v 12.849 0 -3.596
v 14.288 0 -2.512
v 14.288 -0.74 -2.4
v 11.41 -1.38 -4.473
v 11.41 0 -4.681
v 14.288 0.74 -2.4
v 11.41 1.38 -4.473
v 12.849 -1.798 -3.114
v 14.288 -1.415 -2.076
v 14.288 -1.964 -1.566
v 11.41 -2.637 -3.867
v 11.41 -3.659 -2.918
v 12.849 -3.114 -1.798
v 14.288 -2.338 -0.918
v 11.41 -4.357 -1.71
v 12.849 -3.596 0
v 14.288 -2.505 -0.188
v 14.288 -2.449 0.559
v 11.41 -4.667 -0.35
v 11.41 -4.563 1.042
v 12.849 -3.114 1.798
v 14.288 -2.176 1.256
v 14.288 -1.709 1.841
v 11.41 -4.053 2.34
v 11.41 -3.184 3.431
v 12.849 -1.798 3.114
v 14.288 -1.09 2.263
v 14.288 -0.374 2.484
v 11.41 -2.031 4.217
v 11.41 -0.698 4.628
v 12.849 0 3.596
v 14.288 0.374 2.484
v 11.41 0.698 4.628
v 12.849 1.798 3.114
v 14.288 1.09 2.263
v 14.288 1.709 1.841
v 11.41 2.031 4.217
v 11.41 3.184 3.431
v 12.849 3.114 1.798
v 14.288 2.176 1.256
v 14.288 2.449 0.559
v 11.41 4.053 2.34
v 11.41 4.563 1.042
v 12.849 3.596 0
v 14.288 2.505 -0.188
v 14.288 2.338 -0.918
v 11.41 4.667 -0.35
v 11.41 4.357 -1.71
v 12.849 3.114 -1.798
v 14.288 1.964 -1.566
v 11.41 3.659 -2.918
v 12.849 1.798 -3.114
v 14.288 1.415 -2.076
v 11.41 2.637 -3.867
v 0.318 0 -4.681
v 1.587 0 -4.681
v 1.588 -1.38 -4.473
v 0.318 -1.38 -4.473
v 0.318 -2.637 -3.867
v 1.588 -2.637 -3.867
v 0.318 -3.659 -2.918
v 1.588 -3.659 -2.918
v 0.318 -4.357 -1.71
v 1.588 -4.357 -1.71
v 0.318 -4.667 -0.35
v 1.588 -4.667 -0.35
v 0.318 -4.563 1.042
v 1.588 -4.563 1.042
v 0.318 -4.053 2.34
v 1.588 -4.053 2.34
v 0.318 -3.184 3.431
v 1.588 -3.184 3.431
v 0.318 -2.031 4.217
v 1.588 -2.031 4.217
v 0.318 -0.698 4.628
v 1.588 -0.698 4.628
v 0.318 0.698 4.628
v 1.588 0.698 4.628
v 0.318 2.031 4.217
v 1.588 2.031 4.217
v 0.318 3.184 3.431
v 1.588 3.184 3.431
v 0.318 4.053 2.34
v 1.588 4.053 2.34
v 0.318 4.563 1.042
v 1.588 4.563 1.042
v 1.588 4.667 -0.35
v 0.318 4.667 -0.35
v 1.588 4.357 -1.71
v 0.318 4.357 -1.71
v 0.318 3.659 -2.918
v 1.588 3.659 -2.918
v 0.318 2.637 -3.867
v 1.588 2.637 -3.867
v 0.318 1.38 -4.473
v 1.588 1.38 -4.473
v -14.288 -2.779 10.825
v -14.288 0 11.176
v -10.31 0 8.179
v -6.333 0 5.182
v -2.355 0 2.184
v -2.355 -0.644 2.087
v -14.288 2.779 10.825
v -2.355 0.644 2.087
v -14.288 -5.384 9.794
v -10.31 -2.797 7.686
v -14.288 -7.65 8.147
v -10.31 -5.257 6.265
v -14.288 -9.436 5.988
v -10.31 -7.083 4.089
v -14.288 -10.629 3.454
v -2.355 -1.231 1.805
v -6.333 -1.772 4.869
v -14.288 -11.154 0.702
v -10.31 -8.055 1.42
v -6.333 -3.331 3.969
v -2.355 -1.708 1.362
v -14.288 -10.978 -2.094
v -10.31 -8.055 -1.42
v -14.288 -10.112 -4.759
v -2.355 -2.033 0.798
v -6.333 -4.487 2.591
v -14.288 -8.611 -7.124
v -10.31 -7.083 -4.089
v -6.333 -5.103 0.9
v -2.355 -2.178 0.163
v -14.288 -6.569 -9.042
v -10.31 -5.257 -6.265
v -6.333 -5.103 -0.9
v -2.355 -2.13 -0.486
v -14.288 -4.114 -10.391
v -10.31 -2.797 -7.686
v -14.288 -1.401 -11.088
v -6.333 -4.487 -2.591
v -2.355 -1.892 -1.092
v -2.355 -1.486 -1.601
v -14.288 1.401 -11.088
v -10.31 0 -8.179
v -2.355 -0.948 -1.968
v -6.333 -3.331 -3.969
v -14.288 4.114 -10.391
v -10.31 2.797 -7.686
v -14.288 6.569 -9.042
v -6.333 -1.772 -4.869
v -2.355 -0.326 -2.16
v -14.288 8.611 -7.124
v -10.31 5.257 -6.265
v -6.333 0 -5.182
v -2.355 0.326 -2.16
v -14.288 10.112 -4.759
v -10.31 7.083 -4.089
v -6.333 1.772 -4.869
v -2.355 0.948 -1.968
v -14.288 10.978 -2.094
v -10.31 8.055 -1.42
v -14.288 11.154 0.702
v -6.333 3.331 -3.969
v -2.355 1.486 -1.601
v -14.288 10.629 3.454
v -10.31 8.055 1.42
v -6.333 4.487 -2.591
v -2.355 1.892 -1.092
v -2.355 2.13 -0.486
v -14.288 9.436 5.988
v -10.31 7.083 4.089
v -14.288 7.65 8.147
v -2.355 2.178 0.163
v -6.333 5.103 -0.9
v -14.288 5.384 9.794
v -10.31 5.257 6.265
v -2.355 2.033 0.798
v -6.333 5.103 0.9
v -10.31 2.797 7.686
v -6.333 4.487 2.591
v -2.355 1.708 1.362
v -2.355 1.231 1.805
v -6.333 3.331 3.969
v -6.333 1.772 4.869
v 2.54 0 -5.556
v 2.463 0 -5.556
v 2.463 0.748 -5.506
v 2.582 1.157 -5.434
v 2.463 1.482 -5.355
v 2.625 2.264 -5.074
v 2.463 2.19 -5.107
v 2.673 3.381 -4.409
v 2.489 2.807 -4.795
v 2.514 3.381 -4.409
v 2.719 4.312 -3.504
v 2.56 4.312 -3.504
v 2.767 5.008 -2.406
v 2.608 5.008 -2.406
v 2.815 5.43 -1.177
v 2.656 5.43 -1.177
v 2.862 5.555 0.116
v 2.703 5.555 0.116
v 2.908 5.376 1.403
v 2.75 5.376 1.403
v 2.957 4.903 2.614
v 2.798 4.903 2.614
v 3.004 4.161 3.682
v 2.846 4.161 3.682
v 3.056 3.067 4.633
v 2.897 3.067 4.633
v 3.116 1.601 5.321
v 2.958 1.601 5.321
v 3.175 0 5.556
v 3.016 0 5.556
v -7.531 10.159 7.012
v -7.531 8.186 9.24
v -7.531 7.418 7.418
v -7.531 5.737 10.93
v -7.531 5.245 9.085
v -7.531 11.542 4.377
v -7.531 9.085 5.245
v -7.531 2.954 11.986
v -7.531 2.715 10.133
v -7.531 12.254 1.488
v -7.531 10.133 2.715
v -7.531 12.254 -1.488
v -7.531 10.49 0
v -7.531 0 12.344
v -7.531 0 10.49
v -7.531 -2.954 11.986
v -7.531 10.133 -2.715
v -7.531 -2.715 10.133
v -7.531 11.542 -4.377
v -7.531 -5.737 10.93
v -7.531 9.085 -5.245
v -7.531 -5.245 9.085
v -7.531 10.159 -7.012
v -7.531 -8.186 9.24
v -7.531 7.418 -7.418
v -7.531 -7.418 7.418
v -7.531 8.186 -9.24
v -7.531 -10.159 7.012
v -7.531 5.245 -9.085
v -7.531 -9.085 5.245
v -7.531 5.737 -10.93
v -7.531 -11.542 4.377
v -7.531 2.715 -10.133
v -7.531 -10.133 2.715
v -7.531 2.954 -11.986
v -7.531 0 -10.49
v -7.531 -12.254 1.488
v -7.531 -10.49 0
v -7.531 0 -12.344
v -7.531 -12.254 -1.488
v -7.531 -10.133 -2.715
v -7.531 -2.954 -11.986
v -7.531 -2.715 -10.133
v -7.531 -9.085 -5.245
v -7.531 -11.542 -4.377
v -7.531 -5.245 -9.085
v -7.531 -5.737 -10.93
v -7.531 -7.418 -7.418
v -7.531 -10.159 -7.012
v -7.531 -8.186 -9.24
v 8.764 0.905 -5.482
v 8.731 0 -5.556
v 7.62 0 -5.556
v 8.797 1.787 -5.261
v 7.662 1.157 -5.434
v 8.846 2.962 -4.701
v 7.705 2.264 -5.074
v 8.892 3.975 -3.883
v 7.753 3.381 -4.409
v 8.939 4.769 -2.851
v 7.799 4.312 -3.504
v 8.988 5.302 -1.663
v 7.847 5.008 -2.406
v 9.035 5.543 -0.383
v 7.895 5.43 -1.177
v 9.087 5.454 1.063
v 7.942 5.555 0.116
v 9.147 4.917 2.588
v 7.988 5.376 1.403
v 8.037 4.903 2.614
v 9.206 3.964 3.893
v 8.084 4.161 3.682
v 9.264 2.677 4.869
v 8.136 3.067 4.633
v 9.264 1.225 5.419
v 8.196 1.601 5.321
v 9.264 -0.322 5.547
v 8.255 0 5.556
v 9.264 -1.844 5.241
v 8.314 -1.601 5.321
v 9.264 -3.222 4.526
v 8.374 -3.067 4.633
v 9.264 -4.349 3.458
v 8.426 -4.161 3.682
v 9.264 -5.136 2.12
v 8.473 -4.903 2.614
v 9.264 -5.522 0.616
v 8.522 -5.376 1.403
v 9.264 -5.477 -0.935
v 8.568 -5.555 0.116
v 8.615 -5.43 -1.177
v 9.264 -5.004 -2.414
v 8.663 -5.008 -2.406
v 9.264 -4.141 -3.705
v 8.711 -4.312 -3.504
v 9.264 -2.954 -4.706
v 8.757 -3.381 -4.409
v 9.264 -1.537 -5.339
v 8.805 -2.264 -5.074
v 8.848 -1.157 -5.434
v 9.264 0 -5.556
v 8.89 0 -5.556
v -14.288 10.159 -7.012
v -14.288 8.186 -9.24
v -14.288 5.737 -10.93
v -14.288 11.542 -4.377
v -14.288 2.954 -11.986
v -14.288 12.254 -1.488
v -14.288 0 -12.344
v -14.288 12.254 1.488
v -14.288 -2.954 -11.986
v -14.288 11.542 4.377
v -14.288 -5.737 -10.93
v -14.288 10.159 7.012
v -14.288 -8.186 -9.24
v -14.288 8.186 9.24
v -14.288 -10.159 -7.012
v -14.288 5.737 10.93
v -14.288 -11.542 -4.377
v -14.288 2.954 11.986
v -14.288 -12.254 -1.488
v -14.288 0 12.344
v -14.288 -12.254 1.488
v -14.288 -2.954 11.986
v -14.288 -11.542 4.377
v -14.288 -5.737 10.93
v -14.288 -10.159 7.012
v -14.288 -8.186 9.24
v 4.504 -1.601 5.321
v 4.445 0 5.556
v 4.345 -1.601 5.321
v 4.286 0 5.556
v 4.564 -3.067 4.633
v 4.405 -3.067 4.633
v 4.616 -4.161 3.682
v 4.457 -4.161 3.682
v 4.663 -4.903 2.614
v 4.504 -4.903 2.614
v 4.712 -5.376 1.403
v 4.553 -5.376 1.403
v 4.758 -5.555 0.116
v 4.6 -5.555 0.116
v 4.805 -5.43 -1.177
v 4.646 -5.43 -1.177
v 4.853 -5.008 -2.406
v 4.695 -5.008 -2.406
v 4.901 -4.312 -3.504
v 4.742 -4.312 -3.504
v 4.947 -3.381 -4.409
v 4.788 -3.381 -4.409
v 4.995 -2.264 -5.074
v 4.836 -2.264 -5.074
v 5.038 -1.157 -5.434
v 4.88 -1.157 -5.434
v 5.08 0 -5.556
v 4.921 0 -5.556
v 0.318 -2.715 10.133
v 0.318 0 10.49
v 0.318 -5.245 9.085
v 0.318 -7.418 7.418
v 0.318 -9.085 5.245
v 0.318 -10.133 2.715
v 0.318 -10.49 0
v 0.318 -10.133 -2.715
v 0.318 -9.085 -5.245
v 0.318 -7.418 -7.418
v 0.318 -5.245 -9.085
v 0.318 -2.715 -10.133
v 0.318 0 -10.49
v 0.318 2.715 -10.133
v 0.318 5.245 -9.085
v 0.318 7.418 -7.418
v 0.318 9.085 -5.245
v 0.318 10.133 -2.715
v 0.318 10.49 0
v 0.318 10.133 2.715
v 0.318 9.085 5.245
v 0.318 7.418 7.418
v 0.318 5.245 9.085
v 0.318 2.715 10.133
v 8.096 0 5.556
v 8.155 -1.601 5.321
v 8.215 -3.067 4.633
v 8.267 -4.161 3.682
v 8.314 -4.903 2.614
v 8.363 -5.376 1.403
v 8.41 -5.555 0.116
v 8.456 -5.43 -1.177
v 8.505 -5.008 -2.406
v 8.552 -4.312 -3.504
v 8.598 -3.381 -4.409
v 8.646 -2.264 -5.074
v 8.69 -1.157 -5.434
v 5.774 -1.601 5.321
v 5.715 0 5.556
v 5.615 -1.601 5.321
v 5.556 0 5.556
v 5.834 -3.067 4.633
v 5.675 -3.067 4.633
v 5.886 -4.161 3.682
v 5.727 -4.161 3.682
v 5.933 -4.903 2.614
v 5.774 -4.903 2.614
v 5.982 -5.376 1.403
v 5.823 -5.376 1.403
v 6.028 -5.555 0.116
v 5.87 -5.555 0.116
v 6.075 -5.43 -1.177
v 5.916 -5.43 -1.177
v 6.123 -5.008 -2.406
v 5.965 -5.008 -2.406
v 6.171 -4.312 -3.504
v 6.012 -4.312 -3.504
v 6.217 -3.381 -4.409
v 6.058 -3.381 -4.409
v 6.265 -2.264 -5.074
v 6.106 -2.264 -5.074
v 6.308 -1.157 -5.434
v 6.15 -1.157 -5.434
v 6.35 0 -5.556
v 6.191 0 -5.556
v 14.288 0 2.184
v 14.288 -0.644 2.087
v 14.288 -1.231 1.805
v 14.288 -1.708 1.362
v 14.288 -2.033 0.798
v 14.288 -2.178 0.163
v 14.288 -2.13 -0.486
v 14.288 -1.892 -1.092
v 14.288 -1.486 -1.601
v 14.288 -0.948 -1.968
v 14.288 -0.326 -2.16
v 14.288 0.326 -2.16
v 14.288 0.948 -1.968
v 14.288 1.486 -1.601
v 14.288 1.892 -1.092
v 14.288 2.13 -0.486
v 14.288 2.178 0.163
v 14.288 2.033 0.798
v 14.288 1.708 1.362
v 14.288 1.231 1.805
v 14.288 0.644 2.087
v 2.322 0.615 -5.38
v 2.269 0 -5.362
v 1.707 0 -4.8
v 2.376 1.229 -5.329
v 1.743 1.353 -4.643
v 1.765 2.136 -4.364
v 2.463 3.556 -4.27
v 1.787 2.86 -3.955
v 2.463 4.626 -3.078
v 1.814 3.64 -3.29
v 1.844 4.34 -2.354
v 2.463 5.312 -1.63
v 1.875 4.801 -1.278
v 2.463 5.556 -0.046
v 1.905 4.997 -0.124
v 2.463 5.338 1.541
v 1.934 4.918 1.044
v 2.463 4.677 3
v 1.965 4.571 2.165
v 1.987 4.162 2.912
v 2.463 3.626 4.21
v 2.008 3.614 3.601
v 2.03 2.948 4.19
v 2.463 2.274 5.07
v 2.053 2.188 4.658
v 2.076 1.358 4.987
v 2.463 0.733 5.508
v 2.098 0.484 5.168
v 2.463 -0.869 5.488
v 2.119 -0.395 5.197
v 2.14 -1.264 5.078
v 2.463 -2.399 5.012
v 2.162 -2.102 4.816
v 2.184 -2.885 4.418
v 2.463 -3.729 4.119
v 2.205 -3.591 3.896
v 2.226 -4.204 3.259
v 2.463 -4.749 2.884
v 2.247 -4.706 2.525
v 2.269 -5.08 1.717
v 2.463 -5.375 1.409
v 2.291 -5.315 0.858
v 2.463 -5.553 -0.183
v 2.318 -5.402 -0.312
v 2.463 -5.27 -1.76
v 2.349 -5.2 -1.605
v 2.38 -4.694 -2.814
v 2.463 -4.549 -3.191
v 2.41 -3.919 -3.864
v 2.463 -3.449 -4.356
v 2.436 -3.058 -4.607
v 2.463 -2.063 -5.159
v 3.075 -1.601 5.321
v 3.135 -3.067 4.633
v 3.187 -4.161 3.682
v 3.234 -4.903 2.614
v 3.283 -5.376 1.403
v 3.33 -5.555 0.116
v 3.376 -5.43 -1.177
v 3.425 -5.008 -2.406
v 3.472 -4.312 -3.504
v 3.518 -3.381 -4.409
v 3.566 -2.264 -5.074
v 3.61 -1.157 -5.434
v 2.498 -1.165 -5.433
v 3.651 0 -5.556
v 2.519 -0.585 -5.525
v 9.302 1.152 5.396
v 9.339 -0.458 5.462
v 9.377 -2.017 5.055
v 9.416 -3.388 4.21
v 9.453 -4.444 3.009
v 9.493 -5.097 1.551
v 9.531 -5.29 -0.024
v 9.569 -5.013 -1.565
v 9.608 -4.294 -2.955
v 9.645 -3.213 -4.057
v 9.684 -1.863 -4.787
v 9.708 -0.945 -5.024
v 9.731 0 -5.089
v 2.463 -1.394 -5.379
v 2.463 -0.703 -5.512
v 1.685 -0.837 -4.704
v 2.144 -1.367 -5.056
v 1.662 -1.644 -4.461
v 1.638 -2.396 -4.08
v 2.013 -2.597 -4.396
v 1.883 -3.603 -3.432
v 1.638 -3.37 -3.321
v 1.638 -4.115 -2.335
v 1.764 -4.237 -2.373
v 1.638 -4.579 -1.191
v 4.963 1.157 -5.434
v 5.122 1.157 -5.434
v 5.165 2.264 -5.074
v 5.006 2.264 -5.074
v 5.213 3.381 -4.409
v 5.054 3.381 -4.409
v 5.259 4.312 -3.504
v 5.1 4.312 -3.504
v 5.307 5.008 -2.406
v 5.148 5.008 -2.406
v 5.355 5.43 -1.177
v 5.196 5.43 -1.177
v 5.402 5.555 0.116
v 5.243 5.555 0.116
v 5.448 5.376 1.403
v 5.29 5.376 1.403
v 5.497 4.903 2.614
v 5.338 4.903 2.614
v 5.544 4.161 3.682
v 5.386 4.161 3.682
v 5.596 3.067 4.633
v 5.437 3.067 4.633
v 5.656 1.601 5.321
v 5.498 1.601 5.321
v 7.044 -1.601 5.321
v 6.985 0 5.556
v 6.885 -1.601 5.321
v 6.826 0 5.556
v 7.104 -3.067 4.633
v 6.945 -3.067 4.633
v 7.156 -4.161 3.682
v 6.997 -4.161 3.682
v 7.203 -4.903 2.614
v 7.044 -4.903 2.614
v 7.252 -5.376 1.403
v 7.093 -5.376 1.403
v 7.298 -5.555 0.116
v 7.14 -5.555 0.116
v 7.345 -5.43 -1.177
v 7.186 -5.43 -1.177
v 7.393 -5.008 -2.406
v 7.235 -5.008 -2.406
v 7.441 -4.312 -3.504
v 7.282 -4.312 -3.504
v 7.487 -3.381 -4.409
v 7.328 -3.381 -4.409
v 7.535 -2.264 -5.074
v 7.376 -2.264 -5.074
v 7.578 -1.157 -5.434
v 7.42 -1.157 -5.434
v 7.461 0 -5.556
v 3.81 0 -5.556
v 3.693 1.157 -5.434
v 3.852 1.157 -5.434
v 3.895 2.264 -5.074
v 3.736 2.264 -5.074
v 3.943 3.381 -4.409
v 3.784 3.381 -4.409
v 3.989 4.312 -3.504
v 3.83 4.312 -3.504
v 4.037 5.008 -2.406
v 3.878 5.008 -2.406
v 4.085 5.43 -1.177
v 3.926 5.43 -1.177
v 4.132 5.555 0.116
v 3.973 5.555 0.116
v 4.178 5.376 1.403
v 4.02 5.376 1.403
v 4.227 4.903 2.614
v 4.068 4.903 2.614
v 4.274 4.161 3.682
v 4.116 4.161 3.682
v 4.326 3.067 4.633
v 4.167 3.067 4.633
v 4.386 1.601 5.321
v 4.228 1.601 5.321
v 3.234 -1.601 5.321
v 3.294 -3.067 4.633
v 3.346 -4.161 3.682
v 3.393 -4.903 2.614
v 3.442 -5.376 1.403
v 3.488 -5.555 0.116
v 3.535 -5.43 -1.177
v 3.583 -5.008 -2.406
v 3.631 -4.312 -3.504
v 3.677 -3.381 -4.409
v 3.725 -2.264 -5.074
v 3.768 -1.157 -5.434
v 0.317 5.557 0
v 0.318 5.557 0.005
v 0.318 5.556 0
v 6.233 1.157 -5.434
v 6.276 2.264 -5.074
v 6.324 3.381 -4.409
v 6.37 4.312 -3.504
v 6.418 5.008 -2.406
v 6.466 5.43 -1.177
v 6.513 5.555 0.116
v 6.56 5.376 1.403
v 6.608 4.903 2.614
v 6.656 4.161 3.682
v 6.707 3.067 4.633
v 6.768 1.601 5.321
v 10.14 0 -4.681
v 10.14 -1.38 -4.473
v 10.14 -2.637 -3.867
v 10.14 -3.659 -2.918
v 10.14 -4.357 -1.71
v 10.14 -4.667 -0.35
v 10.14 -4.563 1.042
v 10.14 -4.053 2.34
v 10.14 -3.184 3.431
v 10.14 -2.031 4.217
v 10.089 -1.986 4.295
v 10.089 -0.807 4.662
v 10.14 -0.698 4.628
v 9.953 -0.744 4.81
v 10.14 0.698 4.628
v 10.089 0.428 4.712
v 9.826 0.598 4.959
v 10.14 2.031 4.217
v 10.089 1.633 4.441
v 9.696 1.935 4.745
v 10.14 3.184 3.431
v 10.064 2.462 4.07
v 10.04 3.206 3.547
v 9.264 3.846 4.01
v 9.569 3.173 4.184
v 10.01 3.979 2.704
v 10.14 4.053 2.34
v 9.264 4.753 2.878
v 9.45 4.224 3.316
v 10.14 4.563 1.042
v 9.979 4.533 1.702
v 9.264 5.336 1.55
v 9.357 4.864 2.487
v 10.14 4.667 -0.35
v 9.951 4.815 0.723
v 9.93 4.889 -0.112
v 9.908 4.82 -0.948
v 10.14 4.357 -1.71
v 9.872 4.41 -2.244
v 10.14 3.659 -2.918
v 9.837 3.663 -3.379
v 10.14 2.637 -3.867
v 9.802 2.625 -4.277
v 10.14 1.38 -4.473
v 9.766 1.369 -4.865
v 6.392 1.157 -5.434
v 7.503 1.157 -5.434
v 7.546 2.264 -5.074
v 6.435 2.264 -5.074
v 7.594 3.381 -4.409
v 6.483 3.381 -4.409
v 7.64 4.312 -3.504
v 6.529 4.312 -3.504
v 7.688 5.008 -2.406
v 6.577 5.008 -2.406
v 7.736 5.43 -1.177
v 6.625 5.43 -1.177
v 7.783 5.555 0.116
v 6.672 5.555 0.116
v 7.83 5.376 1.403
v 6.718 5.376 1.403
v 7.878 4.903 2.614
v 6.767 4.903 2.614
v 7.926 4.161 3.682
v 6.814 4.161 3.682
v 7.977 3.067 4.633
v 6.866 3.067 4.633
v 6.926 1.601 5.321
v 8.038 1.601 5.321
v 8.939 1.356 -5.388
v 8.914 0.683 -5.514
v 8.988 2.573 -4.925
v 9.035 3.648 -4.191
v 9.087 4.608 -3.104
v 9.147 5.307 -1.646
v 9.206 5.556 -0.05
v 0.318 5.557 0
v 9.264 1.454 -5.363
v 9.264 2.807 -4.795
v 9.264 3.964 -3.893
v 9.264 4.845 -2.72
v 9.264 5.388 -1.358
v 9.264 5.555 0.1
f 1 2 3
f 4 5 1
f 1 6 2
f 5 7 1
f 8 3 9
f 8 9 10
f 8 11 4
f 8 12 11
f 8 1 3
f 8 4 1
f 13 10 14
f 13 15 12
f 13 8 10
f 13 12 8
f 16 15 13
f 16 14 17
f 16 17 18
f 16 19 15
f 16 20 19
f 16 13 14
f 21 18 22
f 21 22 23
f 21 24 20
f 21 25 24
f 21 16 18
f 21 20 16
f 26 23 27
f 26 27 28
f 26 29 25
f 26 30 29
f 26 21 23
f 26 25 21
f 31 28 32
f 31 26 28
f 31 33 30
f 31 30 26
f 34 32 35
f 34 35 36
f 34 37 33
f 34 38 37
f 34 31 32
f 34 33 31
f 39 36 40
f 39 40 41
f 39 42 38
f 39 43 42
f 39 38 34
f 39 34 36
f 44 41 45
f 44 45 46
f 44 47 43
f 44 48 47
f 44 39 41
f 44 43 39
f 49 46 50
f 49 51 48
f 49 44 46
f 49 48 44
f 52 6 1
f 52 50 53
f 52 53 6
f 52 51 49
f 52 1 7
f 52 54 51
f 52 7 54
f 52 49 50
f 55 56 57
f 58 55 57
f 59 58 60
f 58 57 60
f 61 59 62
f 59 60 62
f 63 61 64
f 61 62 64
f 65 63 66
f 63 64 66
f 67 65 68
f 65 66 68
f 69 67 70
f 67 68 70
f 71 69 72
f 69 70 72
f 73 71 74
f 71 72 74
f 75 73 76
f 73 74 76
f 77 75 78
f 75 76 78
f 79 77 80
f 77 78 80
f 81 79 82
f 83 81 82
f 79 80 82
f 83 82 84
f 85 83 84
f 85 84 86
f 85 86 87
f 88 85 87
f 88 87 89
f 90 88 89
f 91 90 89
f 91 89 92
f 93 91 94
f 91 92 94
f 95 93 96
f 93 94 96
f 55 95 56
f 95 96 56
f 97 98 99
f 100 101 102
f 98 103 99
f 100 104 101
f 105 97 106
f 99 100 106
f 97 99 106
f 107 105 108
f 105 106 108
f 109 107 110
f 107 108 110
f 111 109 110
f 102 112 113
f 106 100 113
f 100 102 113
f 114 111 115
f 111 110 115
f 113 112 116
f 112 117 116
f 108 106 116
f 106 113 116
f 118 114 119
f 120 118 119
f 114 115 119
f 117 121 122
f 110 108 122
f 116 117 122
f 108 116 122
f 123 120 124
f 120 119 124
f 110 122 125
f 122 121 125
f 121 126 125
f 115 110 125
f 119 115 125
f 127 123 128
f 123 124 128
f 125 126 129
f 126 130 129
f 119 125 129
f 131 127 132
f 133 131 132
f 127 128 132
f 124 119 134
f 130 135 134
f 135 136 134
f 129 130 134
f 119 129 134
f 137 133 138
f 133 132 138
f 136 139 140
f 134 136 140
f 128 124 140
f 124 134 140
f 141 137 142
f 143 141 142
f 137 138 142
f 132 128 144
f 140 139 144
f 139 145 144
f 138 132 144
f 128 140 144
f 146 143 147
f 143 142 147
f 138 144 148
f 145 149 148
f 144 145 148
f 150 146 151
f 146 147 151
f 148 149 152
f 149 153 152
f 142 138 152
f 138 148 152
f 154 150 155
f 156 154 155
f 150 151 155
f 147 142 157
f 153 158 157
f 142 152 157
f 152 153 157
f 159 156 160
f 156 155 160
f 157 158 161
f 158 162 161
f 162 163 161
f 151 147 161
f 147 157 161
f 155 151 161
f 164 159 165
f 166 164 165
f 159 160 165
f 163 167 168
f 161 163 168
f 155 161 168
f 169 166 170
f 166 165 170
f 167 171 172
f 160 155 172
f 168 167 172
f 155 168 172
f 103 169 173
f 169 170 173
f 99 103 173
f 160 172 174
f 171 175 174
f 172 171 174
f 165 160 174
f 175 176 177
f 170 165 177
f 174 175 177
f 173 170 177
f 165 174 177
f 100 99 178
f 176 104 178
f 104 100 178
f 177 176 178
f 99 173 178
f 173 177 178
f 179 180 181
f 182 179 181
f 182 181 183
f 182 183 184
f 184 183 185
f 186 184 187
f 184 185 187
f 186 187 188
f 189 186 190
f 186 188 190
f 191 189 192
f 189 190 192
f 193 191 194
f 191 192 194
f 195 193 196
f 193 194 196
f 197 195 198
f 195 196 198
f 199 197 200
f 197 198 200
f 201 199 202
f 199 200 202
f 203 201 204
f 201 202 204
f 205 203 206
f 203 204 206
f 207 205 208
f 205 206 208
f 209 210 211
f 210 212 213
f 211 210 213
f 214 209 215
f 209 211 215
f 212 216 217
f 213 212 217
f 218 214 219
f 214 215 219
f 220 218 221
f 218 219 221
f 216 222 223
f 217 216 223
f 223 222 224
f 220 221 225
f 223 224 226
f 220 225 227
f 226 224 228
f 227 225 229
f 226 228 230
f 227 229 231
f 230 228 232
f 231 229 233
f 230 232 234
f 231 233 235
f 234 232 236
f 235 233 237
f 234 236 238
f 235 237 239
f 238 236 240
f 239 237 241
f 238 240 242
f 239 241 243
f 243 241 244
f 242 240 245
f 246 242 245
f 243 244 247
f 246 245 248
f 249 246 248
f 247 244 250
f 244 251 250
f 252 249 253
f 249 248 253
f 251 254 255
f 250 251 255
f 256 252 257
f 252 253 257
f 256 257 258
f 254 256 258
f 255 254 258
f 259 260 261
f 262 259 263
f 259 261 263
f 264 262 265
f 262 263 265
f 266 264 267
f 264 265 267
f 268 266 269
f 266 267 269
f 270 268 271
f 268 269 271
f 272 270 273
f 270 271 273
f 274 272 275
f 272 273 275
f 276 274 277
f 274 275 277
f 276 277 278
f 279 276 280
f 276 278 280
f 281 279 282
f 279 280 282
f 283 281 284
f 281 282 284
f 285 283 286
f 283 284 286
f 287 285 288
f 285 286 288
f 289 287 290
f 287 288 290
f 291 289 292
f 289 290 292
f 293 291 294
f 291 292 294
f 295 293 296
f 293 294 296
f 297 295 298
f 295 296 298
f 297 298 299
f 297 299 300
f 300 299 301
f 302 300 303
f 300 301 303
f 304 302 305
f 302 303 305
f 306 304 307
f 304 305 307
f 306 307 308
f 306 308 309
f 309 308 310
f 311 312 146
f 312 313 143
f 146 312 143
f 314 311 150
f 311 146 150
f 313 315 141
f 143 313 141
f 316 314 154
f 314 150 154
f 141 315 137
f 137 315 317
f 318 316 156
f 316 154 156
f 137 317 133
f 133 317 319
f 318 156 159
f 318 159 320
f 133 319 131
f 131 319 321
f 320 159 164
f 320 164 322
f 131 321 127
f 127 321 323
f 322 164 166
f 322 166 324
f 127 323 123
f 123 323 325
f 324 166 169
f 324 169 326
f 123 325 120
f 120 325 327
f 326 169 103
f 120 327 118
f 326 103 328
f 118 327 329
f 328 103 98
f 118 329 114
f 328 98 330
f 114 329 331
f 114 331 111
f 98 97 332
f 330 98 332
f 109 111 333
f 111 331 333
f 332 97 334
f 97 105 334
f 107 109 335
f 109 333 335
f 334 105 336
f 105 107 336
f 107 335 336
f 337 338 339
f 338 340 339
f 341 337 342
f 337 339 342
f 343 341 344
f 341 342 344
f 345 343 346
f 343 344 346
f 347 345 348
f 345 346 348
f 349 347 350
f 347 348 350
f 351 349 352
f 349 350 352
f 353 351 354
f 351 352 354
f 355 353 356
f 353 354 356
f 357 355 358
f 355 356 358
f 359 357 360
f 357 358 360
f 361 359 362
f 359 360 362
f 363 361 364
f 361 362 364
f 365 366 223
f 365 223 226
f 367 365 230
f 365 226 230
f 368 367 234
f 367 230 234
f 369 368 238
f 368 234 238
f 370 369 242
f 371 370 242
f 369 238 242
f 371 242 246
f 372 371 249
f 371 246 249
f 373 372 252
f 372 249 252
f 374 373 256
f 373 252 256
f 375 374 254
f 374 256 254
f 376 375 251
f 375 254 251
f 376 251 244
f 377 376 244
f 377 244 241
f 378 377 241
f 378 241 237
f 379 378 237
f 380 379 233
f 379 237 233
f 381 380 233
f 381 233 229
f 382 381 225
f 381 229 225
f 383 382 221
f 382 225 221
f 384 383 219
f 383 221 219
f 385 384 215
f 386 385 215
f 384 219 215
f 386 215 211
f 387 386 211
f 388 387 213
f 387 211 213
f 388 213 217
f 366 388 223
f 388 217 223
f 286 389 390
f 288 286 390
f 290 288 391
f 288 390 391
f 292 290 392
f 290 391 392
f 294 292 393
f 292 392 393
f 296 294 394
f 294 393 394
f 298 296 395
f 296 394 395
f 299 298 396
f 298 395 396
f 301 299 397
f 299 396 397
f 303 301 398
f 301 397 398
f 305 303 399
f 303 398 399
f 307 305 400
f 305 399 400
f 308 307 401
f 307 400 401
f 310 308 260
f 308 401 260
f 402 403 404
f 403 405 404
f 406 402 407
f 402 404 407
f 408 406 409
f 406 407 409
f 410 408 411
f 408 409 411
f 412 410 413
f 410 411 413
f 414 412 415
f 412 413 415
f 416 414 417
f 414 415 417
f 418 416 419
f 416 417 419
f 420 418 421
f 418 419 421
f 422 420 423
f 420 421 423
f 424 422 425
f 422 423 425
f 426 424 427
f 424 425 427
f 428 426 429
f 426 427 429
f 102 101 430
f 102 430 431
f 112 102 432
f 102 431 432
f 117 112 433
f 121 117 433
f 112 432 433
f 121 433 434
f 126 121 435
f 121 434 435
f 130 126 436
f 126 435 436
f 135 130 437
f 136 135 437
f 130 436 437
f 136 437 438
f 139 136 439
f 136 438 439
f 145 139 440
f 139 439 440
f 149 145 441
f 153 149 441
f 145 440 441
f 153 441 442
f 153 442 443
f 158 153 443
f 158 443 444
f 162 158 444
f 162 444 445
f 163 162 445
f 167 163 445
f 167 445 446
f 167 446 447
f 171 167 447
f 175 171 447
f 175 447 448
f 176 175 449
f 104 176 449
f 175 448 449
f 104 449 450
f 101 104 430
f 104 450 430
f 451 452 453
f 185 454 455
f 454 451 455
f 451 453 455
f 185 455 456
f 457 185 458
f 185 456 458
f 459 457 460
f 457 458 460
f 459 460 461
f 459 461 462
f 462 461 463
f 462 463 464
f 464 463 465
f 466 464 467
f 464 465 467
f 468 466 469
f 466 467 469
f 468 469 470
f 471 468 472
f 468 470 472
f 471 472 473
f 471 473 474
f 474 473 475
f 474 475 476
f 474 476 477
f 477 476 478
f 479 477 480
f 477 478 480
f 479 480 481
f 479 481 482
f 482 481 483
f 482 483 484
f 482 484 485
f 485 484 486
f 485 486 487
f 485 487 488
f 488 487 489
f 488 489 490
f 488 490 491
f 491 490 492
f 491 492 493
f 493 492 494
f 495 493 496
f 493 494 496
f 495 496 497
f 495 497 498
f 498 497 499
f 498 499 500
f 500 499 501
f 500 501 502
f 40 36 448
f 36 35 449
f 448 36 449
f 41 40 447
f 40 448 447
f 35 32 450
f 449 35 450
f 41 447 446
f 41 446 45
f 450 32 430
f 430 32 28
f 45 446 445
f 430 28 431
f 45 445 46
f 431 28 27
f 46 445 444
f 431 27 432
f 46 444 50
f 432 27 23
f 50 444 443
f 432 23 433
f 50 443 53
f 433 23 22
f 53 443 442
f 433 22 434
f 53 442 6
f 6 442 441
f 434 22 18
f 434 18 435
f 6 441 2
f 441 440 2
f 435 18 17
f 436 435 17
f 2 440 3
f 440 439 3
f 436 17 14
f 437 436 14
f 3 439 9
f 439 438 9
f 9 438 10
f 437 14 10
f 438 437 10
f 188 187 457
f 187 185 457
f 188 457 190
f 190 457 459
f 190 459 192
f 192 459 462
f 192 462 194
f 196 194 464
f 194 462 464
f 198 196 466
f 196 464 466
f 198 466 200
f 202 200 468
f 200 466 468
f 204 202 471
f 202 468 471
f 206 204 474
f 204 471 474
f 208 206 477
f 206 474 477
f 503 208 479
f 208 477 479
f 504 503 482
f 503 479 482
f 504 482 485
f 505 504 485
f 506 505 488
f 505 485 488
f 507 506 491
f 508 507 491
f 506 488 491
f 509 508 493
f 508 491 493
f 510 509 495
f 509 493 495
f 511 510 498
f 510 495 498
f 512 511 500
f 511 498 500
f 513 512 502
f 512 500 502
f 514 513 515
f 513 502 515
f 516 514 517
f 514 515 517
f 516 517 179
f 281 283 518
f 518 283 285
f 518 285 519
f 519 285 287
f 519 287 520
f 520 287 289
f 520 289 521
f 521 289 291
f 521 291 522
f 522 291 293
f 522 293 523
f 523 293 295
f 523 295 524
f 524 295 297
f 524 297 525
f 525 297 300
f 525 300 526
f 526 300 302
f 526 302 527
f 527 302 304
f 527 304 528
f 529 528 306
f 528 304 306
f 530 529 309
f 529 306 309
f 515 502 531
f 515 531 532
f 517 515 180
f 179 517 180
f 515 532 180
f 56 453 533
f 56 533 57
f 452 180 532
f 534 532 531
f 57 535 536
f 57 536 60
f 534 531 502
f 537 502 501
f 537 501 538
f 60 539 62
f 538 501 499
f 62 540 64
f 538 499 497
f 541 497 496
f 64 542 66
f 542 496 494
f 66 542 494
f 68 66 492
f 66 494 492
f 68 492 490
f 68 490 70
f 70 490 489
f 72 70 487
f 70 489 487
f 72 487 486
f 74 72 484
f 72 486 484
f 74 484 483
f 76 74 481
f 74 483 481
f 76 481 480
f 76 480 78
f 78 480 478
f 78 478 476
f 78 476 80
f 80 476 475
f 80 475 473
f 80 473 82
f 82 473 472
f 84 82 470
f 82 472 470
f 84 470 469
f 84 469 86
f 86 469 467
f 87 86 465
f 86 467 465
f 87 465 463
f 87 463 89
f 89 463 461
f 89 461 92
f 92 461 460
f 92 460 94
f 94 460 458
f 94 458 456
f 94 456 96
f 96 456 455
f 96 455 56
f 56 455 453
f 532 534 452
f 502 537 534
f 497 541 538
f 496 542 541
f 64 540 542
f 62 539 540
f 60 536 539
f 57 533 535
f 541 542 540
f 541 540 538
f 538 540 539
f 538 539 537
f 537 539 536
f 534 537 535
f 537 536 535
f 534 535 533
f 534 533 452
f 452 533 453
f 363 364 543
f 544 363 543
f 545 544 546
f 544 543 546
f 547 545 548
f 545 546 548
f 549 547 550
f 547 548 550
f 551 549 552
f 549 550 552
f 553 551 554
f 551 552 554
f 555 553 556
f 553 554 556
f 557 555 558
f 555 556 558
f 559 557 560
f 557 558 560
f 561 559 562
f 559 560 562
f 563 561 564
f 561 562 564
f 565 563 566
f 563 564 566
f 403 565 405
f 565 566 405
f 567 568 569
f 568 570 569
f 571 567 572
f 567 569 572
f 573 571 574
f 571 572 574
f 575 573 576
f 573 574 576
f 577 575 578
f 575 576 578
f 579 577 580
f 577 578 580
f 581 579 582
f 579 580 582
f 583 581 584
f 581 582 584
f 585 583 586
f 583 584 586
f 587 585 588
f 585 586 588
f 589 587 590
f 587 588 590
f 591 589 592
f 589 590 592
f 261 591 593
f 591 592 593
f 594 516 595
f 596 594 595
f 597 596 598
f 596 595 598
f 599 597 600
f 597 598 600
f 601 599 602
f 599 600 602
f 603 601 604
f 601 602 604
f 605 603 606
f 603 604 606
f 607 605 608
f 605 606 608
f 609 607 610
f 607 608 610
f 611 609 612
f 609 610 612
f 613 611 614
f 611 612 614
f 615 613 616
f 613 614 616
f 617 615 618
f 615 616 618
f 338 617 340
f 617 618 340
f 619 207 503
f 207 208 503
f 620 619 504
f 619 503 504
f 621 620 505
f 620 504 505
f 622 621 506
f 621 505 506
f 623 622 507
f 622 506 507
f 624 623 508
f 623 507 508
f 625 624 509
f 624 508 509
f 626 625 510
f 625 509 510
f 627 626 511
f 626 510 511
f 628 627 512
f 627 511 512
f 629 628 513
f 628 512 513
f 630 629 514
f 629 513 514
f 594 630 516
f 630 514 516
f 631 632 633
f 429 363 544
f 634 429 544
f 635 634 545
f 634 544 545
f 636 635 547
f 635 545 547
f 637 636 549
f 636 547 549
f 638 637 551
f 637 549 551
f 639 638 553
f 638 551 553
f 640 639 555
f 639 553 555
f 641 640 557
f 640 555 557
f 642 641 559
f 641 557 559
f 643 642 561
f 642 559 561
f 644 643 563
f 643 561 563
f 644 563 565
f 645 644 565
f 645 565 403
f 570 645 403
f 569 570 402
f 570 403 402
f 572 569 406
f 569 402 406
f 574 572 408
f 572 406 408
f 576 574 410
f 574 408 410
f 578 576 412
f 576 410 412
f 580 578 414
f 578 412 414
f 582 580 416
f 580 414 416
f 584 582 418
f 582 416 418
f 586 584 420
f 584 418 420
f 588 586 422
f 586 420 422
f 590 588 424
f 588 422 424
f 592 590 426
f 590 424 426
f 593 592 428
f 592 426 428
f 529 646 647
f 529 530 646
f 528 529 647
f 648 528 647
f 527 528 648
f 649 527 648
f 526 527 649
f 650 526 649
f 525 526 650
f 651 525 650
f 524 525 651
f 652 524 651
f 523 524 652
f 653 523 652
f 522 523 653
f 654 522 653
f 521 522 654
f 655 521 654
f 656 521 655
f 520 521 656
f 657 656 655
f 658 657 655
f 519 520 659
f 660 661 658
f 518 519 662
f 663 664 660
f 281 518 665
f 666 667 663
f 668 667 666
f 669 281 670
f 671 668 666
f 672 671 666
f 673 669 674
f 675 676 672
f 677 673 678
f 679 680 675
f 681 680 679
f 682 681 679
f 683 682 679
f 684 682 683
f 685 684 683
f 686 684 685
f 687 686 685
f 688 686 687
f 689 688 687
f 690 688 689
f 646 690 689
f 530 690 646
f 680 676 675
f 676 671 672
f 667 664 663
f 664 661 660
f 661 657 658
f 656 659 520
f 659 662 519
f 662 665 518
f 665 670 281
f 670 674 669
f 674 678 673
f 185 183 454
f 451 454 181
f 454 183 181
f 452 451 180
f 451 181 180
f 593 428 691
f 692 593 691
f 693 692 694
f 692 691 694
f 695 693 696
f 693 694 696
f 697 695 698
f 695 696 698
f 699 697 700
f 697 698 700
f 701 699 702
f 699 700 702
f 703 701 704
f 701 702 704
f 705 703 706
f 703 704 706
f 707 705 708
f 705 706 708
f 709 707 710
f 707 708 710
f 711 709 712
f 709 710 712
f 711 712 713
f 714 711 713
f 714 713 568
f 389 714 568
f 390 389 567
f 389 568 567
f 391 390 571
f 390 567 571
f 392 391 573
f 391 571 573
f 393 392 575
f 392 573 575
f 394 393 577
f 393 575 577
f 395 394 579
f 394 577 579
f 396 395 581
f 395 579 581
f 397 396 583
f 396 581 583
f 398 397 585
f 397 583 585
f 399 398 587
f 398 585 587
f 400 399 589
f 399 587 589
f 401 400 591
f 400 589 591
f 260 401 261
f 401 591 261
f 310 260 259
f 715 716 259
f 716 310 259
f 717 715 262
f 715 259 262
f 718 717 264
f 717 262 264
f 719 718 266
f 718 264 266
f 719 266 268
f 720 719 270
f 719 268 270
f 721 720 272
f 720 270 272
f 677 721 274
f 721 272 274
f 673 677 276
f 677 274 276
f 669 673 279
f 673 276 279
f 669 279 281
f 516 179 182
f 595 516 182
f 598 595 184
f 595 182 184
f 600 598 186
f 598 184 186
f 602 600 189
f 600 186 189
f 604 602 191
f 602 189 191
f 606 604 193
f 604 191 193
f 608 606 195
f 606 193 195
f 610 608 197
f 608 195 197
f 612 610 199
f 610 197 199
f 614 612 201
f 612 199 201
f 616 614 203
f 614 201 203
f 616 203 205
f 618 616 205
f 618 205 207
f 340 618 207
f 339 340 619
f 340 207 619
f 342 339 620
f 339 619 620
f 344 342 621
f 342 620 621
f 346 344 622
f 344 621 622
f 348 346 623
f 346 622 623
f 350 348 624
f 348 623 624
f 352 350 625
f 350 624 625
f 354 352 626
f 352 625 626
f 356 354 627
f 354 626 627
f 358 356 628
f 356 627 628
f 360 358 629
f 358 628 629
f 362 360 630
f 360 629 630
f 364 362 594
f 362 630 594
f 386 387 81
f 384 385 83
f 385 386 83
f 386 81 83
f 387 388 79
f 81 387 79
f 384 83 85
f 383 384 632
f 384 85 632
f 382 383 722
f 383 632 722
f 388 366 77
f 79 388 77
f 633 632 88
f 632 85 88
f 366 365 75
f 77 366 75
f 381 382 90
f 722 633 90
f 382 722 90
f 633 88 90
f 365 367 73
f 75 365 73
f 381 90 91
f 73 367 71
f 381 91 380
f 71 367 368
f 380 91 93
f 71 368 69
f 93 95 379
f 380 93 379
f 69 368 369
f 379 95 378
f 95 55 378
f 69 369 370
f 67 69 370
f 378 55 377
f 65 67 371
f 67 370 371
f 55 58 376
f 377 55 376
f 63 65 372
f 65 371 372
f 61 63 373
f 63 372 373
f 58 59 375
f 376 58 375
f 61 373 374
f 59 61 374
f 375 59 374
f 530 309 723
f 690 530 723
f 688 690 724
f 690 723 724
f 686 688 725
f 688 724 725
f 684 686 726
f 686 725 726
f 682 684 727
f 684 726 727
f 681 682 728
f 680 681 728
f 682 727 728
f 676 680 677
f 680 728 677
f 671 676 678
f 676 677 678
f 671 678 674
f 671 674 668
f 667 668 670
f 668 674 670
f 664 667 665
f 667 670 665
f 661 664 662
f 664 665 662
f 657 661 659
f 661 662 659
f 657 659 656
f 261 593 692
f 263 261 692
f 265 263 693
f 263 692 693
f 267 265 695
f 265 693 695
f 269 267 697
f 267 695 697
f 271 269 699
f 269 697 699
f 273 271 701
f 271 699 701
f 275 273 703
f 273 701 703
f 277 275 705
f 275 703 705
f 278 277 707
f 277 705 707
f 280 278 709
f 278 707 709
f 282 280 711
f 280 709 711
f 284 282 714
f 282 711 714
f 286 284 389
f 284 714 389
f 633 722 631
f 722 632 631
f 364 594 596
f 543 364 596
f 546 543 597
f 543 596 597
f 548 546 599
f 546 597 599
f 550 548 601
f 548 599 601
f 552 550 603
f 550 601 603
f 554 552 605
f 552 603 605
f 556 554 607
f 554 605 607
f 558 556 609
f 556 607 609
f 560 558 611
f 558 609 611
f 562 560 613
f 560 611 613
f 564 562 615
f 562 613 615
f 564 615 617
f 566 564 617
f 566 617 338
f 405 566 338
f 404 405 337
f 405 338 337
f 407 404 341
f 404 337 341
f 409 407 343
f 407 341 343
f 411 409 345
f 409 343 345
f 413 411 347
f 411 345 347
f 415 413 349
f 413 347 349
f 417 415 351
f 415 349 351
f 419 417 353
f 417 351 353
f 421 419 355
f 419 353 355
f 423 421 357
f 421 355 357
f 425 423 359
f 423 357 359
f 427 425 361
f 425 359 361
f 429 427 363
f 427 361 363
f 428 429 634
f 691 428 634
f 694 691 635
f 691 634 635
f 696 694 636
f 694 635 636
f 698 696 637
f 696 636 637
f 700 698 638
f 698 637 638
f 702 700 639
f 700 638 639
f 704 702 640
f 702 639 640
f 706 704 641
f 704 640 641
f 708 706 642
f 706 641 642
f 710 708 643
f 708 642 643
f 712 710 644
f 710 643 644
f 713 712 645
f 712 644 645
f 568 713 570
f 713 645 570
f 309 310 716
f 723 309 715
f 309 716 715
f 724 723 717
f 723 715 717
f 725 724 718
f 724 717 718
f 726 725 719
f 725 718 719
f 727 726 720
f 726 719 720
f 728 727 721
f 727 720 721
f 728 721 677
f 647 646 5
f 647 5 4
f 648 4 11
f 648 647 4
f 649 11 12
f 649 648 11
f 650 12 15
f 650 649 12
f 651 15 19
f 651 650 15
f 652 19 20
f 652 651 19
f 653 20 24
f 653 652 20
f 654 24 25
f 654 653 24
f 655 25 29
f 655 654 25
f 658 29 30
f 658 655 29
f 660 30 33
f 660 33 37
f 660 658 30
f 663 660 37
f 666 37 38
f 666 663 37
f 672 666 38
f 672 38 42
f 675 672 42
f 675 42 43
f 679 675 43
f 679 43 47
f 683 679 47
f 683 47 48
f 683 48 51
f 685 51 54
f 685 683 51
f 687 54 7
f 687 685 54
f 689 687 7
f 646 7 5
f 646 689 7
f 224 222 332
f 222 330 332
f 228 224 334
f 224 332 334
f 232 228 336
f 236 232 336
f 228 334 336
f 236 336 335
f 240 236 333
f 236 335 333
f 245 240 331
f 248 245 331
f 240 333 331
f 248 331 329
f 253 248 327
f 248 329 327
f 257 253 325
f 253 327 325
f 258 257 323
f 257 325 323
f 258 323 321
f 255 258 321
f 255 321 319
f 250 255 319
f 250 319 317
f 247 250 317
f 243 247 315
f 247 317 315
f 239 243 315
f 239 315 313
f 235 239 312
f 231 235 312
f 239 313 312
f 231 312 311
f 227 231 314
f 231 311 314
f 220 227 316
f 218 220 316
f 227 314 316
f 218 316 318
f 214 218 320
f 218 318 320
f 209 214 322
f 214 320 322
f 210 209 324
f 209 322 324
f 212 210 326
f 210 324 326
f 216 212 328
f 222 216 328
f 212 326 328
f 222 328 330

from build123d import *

# Parameters (mm, degrees)
CUT_SWEEP1_PITCH = 1.27


with BuildPart() as part:
    # Sketch1 → Revolve1 (revolve)
    with BuildSketch(Plane.XY, mode=Mode.PRIVATE) as revolve1_sk:
        Polygon((-14.2875, 12.3444), (-14.2875, 11.176), (-2.355243782, 2.1844), (14.2875, 2.1844), (14.2875, 2.51206), (14.2875, 5.55625), (10.247723424, 5.55625), (0.3175, 5.55625), (0.3175, 10.4902), (-7.5311, 10.4902), (-7.5311, 12.3444), align=None)
    revolve(revolve1_sk.sketch.rotate(Axis((-14.2875, 0, 0), (1, 0, 0)), 90), axis=Axis((-14.2875, 0, 0), (1, 0, 0)))

    # Cut-Sweep1: the profile of Sketch4 profile screwed along a right-hand helix of 11 turns, 8 arcs to a turn; built about Z, then put on its axis
    cut_sweep1_z = Axis((0, 0, 0), (0, 0, 1))
    cut_sweep1_corners = [(5.55655, 0, 0.000173205), (5.55655, 0, -1.111423205), (4.731360803, 0, -0.635), (4.731360803, 0, -0.47625)]
    with BuildLine(mode=Mode.PRIVATE) as cut_sweep1_profile:
        Line(cut_sweep1_corners[0], cut_sweep1_corners[1])
        Line(cut_sweep1_corners[1], cut_sweep1_corners[2])
        Line(cut_sweep1_corners[2], cut_sweep1_corners[3])
        Line(cut_sweep1_corners[3], cut_sweep1_corners[0])
    cut_sweep1_cap = Face(cut_sweep1_profile.wire())
    cut_sweep1_turn_angles = [0, 22.5, 45, 67.5, 90, 112.5, 135, 157.5, 180, 202.5, 225, 247.5, 270, 292.5, 315, 337.5, 360]
    cut_sweep1_turn_weights = [1, 0.9238795325112867, 1, 0.9238795325112867, 1, 0.9238795325112867, 1, 0.9238795325112867, 1, 0.9238795325112867, 1, 0.9238795325112867, 1, 0.9238795325112867, 1, 0.9238795325112867, 1]
    cut_sweep1_turn_rails = [Edge.make_bspline([Vector(p[0], p[1], 0).rotate(cut_sweep1_z, cut_sweep1_turn_angles[k]) / cut_sweep1_turn_weights[k] + Vector(0, 0, p[2] + CUT_SWEEP1_PITCH * cut_sweep1_turn_angles[k] / 360) for k in range(17)], [0, 0, 0, 1, 1, 2, 2, 3, 3, 4, 4, 5, 5, 6, 6, 7, 7, 8, 8, 8], 2, cut_sweep1_turn_weights) for p in cut_sweep1_corners]
    cut_sweep1_turn_sides = [Face.make_surface_from_curves(cut_sweep1_turn_rails[p[0]], cut_sweep1_turn_rails[p[1]]) for p in [(0, 1), (1, 2), (2, 3), (3, 0)]]
    cut_sweep1_turn = Solid(Shell([*cut_sweep1_turn_sides, cut_sweep1_cap, cut_sweep1_cap.rotate(cut_sweep1_z, 360).moved(Location((0, 0, CUT_SWEEP1_PITCH * 360 / 360)))]))
    cut_sweep1_each = [*[cut_sweep1_turn.moved(Location((0, 0, CUT_SWEEP1_PITCH * i))) for i in range(11)]]
    add(Plane(origin=(14.2875, 0, 0), x_dir=(0, 1, 0), z_dir=(-1, 0, 0)) * Compound([cut_sweep1_each[i] for i in range(0, 11, 2)]), mode=Mode.SUBTRACT)
    add(Plane(origin=(14.2875, 0, 0), x_dir=(0, 1, 0), z_dir=(-1, 0, 0)) * Compound([cut_sweep1_each[i] for i in range(1, 11, 2)]), mode=Mode.SUBTRACT)

    # Sketch5 → Cut-Revolve1 (revolve, cut)
    with BuildSketch(Plane.XY, mode=Mode.PRIVATE) as cut_revolve1_sk:
        Polygon((14.2875, 2.51206), (11.409802239, 4.680560803), (10.139802239, 4.680560803), (9.264113042, 5.55625), (14.2875, 5.55625), align=None)
        Polygon((0.3175, 5.55625), (0.3175, 4.680560803), (1.5875, 4.680560803), (2.463189197, 5.55625), align=None)
    revolve(cut_revolve1_sk.sketch.rotate(Axis((0, 0, 0), (-1, 0, 0)), 90), axis=Axis((0, 0, 0), (-1, 0, 0)), mode=Mode.SUBTRACT)

    # Sketch6 → Revolve2 (revolve)
    with BuildSketch(Plane.XY, mode=Mode.PRIVATE) as revolve2_sk:
        Polygon((2.463189197, 5.55625), (1.5875, 4.680560803), (10.139802239, 4.680560803), (9.264113042, 5.55625), align=None)
    revolve(revolve2_sk.sketch.rotate(Axis((0, 0, 0), (1, 0, 0)), 270), axis=Axis((0, 0, 0), (1, 0, 0)))


solid = part.part
